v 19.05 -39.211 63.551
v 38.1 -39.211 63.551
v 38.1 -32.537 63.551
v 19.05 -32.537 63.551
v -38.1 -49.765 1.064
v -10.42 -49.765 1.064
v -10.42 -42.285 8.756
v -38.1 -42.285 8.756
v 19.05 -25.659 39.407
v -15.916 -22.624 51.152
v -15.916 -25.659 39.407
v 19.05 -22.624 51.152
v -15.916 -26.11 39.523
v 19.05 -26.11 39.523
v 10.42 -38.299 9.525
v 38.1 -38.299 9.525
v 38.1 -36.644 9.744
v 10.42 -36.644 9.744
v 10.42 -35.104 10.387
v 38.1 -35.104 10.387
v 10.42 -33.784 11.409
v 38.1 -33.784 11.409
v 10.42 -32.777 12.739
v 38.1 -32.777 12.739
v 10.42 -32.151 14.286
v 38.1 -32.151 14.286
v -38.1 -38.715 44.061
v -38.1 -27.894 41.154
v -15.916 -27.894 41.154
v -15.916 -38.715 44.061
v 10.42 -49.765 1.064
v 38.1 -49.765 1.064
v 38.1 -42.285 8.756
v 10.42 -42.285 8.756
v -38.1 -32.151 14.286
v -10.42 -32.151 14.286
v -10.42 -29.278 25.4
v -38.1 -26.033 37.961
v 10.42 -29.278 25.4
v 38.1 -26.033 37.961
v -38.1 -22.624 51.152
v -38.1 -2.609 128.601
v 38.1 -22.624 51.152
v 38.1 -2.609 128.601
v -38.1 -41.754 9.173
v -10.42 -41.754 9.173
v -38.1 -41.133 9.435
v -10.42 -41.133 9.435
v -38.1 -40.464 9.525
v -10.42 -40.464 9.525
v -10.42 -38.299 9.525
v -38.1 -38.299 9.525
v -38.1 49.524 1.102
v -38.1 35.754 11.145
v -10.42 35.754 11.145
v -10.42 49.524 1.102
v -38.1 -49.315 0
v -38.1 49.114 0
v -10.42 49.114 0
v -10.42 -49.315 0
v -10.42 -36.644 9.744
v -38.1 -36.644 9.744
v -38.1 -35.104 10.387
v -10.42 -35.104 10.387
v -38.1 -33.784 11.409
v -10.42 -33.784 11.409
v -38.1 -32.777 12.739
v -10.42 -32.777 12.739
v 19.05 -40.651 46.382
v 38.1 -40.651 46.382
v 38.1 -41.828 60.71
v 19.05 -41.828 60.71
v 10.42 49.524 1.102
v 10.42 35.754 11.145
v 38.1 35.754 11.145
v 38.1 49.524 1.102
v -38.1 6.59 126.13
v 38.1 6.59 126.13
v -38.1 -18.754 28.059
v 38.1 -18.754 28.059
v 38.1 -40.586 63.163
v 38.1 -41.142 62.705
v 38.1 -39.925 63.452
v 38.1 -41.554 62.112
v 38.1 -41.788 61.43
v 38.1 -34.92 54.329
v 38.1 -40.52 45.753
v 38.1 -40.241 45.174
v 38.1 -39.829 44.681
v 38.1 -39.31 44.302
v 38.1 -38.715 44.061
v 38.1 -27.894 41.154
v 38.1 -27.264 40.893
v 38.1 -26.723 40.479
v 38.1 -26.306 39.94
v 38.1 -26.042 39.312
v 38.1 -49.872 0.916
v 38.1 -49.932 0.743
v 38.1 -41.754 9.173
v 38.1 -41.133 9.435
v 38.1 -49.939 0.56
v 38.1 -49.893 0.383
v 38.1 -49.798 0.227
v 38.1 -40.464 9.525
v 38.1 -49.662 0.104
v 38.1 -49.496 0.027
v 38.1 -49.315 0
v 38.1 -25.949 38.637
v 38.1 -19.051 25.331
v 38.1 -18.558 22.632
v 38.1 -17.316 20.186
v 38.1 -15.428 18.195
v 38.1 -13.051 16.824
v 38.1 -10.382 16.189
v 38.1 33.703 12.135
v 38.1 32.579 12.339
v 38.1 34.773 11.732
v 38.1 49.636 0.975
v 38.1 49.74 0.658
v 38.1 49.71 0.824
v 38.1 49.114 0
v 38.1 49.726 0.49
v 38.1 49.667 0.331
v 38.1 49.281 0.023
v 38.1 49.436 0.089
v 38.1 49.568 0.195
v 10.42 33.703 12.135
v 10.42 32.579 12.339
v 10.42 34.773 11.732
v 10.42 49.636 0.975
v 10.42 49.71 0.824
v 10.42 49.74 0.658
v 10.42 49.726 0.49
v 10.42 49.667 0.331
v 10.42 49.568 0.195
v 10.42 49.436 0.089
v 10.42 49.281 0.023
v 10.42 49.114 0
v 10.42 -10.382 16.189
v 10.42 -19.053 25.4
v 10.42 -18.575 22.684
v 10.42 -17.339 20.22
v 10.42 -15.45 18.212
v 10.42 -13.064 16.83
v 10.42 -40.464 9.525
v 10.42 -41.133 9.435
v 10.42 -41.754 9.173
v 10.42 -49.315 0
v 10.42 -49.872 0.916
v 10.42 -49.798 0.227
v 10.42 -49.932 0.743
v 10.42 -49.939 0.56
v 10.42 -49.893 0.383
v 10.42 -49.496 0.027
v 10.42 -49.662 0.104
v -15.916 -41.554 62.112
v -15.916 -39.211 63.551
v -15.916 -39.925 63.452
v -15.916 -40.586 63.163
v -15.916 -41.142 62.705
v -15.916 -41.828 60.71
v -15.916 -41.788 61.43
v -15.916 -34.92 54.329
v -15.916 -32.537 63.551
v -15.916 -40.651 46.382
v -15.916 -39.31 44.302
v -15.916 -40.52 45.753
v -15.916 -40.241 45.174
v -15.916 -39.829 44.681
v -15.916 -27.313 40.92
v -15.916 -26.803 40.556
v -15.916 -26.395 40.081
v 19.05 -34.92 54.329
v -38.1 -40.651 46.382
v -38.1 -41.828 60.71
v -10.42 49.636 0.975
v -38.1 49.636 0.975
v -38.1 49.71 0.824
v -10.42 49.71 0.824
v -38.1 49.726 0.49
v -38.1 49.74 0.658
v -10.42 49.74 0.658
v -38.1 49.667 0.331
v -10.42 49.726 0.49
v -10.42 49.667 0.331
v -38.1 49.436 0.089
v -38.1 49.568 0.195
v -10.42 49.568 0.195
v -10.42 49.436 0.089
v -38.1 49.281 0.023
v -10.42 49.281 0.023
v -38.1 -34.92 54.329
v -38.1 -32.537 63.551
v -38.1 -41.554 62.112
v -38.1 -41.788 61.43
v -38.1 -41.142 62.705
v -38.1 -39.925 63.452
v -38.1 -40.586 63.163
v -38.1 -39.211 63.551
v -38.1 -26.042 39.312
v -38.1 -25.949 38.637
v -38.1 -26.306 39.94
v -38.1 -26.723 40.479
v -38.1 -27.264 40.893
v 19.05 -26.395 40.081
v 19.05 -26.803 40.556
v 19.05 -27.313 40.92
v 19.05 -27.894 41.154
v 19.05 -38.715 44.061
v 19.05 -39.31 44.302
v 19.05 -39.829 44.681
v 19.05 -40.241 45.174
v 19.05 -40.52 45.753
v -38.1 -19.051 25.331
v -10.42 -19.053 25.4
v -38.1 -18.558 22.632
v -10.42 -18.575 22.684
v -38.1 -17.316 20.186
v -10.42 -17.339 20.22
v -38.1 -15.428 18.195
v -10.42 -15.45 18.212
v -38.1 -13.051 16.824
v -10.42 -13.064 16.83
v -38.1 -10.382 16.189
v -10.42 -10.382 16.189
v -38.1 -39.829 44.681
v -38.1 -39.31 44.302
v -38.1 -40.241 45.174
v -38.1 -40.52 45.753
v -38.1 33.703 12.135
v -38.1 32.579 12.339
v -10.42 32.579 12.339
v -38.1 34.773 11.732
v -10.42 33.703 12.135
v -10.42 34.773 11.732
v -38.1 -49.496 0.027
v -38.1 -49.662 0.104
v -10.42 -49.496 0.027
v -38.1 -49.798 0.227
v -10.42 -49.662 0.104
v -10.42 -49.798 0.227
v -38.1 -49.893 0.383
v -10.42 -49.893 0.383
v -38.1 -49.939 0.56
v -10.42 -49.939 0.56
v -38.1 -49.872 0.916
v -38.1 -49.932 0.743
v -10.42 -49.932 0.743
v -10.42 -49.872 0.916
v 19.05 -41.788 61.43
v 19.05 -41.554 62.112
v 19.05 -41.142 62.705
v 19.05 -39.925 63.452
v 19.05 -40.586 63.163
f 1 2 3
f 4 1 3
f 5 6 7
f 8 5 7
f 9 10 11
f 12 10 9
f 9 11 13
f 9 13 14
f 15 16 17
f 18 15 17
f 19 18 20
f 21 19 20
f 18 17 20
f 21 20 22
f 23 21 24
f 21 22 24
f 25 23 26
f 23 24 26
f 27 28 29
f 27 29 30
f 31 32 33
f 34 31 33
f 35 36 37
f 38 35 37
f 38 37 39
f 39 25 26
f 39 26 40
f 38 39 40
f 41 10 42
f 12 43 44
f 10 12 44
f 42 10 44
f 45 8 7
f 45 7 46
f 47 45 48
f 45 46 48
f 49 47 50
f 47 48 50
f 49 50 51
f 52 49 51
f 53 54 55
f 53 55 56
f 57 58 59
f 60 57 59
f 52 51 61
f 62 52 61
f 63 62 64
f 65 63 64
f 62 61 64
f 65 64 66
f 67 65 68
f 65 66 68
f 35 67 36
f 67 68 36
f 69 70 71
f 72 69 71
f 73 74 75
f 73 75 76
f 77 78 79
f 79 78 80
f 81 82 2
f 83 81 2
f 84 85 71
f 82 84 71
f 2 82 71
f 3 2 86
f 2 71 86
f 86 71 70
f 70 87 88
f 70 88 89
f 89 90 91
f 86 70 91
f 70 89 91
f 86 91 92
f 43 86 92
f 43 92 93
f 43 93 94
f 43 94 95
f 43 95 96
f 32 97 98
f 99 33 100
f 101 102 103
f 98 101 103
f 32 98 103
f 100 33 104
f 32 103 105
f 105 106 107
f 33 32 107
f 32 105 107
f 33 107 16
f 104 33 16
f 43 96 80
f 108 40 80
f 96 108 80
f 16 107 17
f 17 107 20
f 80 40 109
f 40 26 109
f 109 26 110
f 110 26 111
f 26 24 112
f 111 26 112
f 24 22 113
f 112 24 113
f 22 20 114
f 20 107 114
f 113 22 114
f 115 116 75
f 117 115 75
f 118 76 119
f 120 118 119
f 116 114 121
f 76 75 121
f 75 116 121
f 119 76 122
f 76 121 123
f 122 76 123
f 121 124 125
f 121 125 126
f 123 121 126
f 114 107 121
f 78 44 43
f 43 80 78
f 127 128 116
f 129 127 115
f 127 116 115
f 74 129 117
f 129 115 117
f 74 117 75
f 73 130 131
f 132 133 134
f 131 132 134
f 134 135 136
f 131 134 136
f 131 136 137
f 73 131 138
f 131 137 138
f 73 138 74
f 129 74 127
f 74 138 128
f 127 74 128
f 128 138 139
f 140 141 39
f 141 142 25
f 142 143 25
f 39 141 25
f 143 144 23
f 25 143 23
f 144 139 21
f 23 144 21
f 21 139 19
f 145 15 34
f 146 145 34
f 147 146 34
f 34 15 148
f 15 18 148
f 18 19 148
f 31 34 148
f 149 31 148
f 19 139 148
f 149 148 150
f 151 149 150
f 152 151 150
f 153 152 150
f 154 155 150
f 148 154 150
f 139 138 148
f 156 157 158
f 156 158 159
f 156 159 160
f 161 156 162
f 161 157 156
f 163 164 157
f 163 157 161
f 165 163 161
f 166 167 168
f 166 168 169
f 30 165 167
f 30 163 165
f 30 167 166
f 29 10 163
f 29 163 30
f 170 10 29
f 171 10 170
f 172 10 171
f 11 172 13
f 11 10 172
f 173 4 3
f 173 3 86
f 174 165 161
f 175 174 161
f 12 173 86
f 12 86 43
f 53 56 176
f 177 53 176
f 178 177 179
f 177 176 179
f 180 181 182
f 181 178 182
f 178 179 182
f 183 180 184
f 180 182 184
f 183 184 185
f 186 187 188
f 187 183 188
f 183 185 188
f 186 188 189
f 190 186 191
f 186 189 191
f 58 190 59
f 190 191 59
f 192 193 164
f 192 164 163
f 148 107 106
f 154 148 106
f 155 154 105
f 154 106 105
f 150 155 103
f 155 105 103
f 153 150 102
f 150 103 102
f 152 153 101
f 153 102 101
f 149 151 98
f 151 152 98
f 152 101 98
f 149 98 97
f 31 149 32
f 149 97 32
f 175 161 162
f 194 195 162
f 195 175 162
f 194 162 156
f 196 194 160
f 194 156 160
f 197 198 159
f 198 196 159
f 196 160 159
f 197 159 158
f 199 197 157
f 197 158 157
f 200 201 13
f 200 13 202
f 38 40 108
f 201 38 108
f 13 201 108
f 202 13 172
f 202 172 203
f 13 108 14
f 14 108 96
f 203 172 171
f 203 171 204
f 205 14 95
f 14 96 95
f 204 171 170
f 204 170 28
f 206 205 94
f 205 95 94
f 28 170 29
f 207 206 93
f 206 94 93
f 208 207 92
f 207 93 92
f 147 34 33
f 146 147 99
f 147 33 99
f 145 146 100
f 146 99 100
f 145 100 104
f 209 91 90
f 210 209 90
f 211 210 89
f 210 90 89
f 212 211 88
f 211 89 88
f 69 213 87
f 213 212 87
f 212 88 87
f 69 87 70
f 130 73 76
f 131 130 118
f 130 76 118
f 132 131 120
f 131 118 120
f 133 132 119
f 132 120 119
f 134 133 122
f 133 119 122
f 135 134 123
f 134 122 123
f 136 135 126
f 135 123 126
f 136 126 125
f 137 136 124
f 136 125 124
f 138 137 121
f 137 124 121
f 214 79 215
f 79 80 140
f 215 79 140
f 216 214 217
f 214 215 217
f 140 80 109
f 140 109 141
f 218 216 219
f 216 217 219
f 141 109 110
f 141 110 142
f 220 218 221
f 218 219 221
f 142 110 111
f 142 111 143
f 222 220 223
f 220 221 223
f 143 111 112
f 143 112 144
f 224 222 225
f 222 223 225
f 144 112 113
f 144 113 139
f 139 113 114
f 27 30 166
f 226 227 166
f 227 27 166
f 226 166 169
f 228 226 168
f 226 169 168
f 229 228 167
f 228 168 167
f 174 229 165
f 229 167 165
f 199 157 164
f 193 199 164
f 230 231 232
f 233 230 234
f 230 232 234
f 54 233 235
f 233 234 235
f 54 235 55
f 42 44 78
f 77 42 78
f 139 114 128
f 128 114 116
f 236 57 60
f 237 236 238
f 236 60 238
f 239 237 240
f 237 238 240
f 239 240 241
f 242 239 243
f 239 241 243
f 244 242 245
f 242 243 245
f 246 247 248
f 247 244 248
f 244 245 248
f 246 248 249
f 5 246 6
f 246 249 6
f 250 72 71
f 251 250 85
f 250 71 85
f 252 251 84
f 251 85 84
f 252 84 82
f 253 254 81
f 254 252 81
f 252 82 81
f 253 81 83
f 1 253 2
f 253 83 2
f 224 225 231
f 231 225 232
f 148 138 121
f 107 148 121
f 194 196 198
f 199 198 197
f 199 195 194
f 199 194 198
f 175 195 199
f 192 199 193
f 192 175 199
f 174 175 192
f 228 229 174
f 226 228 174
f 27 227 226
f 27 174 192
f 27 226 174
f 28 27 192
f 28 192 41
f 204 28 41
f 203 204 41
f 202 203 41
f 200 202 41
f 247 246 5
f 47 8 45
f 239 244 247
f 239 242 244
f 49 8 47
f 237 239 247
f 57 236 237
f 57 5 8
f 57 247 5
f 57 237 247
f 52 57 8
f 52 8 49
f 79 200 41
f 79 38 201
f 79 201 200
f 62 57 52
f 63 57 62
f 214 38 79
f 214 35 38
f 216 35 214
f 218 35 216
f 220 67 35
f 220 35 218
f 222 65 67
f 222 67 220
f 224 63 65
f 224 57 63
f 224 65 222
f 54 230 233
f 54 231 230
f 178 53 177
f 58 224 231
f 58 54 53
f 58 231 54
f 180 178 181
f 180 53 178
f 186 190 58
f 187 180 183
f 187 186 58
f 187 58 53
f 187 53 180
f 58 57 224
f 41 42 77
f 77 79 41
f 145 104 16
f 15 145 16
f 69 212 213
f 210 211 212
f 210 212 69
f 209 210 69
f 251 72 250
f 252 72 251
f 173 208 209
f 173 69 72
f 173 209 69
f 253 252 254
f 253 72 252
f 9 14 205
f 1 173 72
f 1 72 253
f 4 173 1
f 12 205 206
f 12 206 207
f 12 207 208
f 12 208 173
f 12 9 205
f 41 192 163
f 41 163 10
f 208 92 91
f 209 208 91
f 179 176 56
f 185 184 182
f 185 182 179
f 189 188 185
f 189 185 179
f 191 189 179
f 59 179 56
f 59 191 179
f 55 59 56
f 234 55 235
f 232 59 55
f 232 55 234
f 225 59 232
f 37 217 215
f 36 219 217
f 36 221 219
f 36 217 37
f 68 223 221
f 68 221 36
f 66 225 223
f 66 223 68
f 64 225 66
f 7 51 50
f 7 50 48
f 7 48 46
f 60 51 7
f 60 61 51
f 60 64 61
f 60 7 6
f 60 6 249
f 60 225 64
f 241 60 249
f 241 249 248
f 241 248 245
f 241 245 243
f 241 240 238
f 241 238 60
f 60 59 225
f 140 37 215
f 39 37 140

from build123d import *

# Parameters (mm, degrees)
F0_W     = 76.2
F0_H     = 101.6
F1_DEPTH = 133.35
F3_DEPTH = 76.201
F4_W     = 34.9662494294
F4_H     = 12.1309220302
F5_DEPTH = 25.4
F6_W     = 20.8403859288
F6_H     = 113.2664903998
F7_DEPTH = 25.4


# Not quite as in the source:
# - a feature names something its author has since deleted; it is built from what else it names


with BuildPart() as f1:
    # F0 (on Top) → F1 (new body)
    with BuildSketch(Plane.XY):
        Rectangle(F0_W, F0_H)
    extrude(amount=F1_DEPTH)

    # F2 (on face) → F3 (cut, through all)
    with BuildSketch(Plane.YZ.offset(38.1)):
        with BuildLine():
            Line((49.114014449, 0), (50.8, 0))
            Line((50.8, 0), (50.8, 66.2650913))
            Line((50.8, 66.2650913), (50.8, 73.7310647964))
            Line((50.8, 73.7310647964), (50.8, 128.6014442141))
            Line((50.8, 128.6014442141), (50.8, 133.35))
            Line((50.8, 133.35), (-50.8, 133.35))
            Line((-50.8, 133.35), (-50.8, 0))
            Line((-50.8, 0), (-49.3153884285, 0))
            ThreePointArc((-49.3153884285, 0), (-49.8930613229, 0.38308634), (-49.7649416709, 1.0642959051))
            Line((-49.7649416709, 1.0642959051), (-42.2846688887, 8.7558660005))
            ThreePointArc((-42.2846688887, 8.7558660005), (-41.4521127702, 9.3248290153), (-40.4637807514, 9.525))
            Line((-40.4637807514, 9.525), (-38.2985454719, 9.525))
            ThreePointArc((-38.2985454719, 9.525), (-34.4105014329, 10.8544807489), (-32.1505139925, 14.2862240786))
            Line((-32.1505139925, 14.2862240786), (-26.0325690106, 37.9606251271))
            ThreePointArc((-26.0325690106, 37.9606251271), (-26.3063034957, 39.9399780989), (-27.8936985581, 41.1536278306))
            Line((-27.8936985581, 41.1536278306), (-38.7149990474, 44.0606170611))
            ThreePointArc((-38.7149990474, 44.0606170611), (-40.050293777, 44.9146793042), (-40.6508289049, 46.3815780362))
            Line((-40.6508289049, 46.3815780362), (-41.828178264, 60.7104246977))
            ThreePointArc((-41.828178264, 60.7104246977), (-41.1424179273, 62.7046091009), (-39.2110885015, 63.5513707689))
            Line((-39.2110885015, 63.5513707689), (-32.5366084985, 63.5513707689))
            Line((-32.5366084985, 63.5513707689), (-34.9197723805, 54.3293235498))
            Line((-34.9197723805, 54.3293235498), (-22.6237094217, 51.1517717071))
            Line((-22.6237094217, 51.1517717071), (-2.6091445634, 128.6014442141))
            Line((-2.6091445634, 128.6014442141), (6.5897179326, 126.1302999894))
            Line((6.5897179326, 126.1302999894), (-18.753958765, 28.0587468857))
            ThreePointArc((-18.753958765, 28.0587468857), (-17.3156963729, 20.1857452314), (-10.3820422123, 16.1885970308))
            Line((-10.3820422123, 16.1885970308), (32.5785662344, 12.338888515))
            ThreePointArc((32.5785662344, 12.338888515), (34.2472884437, 11.9577274025), (35.7535762689, 11.144699363))
            Line((35.7535762689, 11.144699363), (49.5238091926, 1.1017641769))
            ThreePointArc((49.5238091926, 1.1017641769), (49.7017678057, 0.4084810434), (49.114014449, 0))
        make_face()
    extrude(amount=-F3_DEPTH, mode=Mode.SUBTRACT)

    # F4 (on face) → F5 (cut)
    with BuildSketch(Plane(origin=(0, -33.598613666, 8.682562632), x_dir=(1, 0, 0), z_dir=(0, -0.9681939338, 0.2502009325))):
        Polygon((19.05, 73.9268932369), (-15.9162494294, 83.0707615279), (-15.9162494294, 43.8643618742), (19.05, 43.8643618742), align=None)
        with Locations((1.5668752853, 37.7989008591)):
            Rectangle(F4_W, F4_H)
    extrude(amount=F5_DEPTH, mode=Mode.SUBTRACT)

    # F6 (on face) → F7 (cut)
    with BuildSketch(Plane(origin=(0, 0, 0), x_dir=(1, 0, 0), z_dir=(0, 0, -1))):
        Rectangle(F6_W, F6_H)
    extrude(amount=-F7_DEPTH, mode=Mode.SUBTRACT)


solid = f1.part
